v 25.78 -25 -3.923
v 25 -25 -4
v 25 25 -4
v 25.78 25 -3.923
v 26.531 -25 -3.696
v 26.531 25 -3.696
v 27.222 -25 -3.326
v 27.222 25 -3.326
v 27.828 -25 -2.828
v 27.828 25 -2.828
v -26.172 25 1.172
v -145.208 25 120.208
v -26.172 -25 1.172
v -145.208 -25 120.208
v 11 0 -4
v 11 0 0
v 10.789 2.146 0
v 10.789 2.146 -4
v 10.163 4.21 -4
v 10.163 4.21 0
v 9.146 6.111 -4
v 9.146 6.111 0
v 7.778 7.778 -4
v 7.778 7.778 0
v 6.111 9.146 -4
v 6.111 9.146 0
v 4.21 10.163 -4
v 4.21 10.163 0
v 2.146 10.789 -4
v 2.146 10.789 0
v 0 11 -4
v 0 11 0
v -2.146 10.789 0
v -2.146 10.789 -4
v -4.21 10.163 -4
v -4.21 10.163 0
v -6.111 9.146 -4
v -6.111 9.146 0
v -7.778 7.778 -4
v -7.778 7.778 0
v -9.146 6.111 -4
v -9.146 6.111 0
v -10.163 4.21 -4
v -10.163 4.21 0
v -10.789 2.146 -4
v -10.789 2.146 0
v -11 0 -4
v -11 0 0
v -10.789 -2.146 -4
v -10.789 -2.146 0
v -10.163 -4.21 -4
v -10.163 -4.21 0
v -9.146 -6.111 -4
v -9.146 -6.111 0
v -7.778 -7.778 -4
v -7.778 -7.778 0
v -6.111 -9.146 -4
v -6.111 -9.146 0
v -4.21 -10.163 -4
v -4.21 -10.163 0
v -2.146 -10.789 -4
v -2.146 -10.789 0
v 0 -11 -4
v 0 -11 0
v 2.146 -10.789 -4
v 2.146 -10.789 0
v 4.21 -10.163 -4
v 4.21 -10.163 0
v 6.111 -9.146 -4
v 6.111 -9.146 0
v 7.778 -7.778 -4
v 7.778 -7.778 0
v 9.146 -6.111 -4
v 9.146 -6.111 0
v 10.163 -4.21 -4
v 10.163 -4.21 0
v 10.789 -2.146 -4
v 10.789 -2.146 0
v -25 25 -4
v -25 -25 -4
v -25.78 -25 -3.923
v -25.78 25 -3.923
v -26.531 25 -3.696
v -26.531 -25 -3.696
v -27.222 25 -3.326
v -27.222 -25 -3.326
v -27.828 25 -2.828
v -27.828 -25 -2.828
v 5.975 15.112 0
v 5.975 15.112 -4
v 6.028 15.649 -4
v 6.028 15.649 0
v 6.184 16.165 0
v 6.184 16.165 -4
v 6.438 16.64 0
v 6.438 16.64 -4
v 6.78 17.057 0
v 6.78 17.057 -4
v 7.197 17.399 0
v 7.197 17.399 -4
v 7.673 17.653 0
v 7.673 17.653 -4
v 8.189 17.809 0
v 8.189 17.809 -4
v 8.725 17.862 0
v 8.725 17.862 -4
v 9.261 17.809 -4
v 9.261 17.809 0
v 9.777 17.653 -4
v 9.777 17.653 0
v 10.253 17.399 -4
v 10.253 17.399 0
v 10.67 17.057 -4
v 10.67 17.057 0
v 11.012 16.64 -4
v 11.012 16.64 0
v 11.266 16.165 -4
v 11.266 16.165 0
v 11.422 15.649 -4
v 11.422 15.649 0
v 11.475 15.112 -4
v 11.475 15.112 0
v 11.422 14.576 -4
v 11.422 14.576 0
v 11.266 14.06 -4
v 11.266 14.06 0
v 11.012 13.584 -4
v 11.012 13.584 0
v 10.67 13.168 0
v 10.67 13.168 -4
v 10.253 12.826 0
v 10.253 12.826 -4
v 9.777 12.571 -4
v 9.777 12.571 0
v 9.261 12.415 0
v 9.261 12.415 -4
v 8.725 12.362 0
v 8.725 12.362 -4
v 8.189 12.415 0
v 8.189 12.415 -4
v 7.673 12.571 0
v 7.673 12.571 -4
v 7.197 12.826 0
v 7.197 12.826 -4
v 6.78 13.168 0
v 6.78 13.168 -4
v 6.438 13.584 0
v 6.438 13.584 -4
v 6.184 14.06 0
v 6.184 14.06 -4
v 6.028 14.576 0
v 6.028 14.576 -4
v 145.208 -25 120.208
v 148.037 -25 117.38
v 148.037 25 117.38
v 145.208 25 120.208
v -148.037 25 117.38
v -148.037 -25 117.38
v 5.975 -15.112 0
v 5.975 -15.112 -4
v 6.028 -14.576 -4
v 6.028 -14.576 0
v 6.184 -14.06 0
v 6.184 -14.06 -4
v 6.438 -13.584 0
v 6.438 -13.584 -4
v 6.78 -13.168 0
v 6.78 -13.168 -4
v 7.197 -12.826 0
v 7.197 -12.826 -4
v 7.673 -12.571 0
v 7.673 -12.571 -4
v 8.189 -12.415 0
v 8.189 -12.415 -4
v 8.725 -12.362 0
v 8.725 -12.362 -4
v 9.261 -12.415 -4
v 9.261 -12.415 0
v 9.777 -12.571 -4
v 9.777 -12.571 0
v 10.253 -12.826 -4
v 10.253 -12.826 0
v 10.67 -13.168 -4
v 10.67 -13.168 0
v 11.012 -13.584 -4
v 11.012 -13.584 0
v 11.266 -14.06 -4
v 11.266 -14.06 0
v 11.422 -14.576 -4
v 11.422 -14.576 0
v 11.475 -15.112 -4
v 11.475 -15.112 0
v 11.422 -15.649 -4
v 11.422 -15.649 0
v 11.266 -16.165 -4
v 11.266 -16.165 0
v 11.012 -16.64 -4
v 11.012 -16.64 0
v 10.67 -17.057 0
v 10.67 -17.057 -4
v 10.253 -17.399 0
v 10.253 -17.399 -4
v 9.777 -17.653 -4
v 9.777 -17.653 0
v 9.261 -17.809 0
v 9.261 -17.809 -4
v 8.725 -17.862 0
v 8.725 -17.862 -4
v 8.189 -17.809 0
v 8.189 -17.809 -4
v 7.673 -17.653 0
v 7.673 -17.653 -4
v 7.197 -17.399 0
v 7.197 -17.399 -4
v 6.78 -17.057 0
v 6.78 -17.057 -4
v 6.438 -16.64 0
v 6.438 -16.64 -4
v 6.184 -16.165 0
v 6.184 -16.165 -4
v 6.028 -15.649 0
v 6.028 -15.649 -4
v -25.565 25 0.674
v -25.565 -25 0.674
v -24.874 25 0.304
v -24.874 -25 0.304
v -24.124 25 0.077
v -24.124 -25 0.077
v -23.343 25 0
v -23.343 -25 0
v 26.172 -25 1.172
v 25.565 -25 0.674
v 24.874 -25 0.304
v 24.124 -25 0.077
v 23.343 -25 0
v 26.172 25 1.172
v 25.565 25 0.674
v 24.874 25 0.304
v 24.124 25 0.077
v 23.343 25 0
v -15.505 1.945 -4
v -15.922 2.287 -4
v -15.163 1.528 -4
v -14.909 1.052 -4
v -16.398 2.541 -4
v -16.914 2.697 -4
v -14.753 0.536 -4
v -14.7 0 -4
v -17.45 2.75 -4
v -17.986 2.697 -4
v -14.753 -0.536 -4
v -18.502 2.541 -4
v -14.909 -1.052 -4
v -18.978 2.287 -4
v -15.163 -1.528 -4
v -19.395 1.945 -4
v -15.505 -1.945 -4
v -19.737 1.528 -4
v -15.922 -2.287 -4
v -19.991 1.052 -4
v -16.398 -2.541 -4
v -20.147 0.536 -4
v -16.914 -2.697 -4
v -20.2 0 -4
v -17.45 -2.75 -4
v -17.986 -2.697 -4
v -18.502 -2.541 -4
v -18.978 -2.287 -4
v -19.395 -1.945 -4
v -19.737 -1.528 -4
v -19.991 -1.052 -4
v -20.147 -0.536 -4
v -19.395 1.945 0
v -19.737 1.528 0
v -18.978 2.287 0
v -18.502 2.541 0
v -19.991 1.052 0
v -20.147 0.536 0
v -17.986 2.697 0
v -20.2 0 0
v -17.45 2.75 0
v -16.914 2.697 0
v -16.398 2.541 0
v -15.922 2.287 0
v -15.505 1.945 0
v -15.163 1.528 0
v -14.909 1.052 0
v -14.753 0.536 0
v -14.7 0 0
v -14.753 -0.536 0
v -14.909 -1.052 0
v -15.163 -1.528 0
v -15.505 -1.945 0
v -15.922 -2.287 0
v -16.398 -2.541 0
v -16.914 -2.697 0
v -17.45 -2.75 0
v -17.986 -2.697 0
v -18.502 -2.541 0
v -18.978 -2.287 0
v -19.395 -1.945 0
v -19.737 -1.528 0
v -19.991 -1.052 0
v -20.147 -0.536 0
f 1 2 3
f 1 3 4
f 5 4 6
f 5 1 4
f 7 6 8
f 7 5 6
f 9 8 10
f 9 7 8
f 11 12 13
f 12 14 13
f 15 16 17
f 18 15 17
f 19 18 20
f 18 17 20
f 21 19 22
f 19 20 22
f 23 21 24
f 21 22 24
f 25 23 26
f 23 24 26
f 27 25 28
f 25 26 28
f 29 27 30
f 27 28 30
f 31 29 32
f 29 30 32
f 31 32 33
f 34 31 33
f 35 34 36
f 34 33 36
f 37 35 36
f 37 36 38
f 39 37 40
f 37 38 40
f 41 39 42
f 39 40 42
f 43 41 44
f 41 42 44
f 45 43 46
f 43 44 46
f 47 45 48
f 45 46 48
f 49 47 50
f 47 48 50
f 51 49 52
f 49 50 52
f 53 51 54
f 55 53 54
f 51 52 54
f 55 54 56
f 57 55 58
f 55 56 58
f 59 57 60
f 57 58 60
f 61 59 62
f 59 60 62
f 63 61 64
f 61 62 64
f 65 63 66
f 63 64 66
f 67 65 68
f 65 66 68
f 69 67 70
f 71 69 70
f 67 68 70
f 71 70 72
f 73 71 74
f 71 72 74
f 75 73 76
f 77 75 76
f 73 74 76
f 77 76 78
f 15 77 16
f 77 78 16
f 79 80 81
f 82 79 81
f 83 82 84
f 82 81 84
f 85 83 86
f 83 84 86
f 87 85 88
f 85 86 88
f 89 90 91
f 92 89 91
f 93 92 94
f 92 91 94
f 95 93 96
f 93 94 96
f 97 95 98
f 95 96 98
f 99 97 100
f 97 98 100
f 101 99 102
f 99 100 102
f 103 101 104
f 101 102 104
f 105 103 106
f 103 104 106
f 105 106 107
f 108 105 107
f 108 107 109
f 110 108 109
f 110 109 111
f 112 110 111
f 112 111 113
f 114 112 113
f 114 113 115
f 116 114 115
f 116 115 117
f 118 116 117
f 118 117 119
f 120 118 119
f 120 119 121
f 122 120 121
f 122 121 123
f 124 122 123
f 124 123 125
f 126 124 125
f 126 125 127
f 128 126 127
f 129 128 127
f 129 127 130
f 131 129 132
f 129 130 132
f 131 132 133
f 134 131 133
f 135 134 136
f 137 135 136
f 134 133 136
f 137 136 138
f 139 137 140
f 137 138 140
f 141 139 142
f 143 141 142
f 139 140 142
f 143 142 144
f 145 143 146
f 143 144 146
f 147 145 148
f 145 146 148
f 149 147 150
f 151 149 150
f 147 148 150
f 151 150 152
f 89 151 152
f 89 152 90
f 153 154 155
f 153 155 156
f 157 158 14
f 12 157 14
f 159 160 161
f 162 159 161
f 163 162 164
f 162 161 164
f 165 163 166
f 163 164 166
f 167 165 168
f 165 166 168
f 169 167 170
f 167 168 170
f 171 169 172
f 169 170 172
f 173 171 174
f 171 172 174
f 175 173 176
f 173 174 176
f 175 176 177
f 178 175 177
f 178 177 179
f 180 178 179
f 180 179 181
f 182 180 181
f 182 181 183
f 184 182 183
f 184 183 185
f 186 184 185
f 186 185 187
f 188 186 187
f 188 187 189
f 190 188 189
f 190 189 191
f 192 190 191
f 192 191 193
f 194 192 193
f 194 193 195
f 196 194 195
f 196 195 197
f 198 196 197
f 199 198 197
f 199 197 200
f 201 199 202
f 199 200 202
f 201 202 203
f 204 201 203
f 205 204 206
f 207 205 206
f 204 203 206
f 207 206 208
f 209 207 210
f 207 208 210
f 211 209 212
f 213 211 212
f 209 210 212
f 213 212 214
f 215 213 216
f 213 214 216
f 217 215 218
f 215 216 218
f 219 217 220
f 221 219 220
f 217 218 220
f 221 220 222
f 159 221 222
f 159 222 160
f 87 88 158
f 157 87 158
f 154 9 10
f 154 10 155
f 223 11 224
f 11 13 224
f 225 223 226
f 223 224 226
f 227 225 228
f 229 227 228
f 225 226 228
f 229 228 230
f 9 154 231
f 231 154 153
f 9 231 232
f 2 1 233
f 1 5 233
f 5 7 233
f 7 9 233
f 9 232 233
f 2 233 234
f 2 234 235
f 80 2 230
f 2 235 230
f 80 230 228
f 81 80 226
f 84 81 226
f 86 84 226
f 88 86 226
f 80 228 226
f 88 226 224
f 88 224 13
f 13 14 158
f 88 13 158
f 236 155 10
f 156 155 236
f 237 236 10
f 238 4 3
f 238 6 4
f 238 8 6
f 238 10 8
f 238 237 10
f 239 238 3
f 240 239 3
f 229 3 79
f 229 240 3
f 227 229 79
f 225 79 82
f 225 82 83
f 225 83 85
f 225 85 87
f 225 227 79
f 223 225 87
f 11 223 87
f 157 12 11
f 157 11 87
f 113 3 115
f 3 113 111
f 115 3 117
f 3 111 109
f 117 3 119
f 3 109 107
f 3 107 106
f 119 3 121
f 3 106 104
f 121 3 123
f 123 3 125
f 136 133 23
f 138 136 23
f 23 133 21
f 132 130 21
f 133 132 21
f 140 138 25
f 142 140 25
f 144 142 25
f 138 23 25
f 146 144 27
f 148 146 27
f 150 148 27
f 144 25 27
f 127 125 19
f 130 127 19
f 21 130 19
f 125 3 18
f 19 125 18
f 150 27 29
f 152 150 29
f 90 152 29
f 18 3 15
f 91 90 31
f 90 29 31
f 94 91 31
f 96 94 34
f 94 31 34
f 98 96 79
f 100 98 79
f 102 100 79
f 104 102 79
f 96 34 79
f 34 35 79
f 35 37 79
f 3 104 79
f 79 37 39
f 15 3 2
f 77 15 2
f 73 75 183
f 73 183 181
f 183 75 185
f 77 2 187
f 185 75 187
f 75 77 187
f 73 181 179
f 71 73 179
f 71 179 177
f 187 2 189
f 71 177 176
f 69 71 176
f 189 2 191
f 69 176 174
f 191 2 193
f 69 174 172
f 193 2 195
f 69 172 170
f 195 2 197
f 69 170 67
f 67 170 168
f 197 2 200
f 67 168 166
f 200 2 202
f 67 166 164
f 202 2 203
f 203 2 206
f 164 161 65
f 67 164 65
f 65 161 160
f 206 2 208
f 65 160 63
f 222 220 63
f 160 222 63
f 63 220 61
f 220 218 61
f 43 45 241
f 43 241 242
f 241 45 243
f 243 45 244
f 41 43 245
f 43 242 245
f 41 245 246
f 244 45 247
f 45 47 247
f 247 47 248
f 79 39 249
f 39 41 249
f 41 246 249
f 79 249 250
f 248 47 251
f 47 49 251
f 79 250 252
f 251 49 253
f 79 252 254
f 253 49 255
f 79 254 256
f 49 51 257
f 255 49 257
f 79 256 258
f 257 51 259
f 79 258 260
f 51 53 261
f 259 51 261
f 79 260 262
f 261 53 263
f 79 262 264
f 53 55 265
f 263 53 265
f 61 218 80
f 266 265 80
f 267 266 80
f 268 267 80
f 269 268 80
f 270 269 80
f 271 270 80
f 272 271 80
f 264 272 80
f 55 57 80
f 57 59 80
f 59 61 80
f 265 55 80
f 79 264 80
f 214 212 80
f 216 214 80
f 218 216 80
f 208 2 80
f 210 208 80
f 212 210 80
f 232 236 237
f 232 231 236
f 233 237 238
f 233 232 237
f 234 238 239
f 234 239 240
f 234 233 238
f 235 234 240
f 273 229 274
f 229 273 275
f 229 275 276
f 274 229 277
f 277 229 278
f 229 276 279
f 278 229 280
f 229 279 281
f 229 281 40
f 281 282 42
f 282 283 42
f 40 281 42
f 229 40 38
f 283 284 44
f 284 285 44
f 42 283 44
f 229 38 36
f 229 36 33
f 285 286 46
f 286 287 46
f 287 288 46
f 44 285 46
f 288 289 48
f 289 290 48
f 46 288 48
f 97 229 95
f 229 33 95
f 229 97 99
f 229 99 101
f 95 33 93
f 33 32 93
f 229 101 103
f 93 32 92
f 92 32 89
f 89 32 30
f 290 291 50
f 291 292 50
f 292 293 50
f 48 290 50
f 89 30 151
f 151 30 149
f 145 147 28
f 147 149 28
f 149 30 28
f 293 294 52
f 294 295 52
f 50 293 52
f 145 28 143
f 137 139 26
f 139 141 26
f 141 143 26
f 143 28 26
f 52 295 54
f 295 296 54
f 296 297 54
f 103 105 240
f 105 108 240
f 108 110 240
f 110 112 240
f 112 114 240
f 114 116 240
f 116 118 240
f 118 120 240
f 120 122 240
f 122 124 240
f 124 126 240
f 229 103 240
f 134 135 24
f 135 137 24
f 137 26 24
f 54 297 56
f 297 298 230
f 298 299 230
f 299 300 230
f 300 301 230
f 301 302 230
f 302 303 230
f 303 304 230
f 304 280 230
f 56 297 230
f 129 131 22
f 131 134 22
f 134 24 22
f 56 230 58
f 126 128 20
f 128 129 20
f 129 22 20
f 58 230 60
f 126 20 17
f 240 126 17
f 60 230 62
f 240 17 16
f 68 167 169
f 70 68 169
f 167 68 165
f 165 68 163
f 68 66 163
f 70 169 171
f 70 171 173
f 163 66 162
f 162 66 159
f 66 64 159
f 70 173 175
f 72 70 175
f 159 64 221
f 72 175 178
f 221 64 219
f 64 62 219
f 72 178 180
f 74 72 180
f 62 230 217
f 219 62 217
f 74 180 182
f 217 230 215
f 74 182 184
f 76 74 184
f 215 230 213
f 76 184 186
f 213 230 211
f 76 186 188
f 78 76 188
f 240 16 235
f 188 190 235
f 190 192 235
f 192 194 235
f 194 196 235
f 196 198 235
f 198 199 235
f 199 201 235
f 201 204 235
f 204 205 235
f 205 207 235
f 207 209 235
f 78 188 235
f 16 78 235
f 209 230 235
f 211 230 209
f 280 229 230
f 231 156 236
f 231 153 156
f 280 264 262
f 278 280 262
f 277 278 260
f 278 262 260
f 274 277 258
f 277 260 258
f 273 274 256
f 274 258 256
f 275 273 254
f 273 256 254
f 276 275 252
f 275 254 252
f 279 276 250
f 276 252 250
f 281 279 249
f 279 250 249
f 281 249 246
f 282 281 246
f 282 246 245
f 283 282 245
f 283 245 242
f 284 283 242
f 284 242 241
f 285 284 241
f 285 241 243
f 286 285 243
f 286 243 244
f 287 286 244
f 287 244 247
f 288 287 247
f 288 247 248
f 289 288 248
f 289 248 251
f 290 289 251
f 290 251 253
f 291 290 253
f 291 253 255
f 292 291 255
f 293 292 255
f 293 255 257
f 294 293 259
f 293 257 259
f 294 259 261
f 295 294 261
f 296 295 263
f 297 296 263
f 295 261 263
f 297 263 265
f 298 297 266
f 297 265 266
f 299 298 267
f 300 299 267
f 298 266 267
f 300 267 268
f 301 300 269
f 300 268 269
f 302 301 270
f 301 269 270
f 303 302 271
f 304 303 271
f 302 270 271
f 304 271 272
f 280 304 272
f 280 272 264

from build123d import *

# Parameters (mm, degrees)
F1_DEPTH = 25
F4_D     = 5.5
F3_R     = 11
F5_DEPTH = 4


with BuildPart() as f1:
    # F0 (on Front) → F1 (new body, symmetric)
    with BuildSketch(Plane.XZ):
        with BuildLine():
            Line((23.3431457505, 0), (0, 0))
            Line((0, 0), (0, -4))
            Line((0, -4), (25, -4))
            ThreePointArc((25, -4), (26.5307337295, -3.69551813), (27.8284271247, -2.8284271247))
            Line((27.8284271247, -2.8284271247), (148.0365799265, 117.379725677))
            Line((148.0365799265, 117.379725677), (145.2081528017, 120.2081528017))
            Line((145.2081528017, 120.2081528017), (26.1715728753, 1.1715728753))
            ThreePointArc((26.1715728753, 1.1715728753), (24.87387948, 0.30448187), (23.3431457505, 0))
        make_face()
    extrude(amount=F1_DEPTH, both=True)

    # F2: F1 across plane


with BuildPart() as f1_1:
    add(f1.part)
    add(f1.part.mirror(Plane.YZ))

    # F4 (through all)
    with Locations(Plane.XY):
        with Locations((-17.45, 0), (8.725, -15.112143296), (8.725, 15.112143296)):
            Hole(F4_D / 2)

    # F3 (on face) → F5 (cut, through all)
    with BuildSketch(Plane.XY):
        Circle(F3_R)
    extrude(amount=-F5_DEPTH, mode=Mode.SUBTRACT)


solid = f1_1.part
